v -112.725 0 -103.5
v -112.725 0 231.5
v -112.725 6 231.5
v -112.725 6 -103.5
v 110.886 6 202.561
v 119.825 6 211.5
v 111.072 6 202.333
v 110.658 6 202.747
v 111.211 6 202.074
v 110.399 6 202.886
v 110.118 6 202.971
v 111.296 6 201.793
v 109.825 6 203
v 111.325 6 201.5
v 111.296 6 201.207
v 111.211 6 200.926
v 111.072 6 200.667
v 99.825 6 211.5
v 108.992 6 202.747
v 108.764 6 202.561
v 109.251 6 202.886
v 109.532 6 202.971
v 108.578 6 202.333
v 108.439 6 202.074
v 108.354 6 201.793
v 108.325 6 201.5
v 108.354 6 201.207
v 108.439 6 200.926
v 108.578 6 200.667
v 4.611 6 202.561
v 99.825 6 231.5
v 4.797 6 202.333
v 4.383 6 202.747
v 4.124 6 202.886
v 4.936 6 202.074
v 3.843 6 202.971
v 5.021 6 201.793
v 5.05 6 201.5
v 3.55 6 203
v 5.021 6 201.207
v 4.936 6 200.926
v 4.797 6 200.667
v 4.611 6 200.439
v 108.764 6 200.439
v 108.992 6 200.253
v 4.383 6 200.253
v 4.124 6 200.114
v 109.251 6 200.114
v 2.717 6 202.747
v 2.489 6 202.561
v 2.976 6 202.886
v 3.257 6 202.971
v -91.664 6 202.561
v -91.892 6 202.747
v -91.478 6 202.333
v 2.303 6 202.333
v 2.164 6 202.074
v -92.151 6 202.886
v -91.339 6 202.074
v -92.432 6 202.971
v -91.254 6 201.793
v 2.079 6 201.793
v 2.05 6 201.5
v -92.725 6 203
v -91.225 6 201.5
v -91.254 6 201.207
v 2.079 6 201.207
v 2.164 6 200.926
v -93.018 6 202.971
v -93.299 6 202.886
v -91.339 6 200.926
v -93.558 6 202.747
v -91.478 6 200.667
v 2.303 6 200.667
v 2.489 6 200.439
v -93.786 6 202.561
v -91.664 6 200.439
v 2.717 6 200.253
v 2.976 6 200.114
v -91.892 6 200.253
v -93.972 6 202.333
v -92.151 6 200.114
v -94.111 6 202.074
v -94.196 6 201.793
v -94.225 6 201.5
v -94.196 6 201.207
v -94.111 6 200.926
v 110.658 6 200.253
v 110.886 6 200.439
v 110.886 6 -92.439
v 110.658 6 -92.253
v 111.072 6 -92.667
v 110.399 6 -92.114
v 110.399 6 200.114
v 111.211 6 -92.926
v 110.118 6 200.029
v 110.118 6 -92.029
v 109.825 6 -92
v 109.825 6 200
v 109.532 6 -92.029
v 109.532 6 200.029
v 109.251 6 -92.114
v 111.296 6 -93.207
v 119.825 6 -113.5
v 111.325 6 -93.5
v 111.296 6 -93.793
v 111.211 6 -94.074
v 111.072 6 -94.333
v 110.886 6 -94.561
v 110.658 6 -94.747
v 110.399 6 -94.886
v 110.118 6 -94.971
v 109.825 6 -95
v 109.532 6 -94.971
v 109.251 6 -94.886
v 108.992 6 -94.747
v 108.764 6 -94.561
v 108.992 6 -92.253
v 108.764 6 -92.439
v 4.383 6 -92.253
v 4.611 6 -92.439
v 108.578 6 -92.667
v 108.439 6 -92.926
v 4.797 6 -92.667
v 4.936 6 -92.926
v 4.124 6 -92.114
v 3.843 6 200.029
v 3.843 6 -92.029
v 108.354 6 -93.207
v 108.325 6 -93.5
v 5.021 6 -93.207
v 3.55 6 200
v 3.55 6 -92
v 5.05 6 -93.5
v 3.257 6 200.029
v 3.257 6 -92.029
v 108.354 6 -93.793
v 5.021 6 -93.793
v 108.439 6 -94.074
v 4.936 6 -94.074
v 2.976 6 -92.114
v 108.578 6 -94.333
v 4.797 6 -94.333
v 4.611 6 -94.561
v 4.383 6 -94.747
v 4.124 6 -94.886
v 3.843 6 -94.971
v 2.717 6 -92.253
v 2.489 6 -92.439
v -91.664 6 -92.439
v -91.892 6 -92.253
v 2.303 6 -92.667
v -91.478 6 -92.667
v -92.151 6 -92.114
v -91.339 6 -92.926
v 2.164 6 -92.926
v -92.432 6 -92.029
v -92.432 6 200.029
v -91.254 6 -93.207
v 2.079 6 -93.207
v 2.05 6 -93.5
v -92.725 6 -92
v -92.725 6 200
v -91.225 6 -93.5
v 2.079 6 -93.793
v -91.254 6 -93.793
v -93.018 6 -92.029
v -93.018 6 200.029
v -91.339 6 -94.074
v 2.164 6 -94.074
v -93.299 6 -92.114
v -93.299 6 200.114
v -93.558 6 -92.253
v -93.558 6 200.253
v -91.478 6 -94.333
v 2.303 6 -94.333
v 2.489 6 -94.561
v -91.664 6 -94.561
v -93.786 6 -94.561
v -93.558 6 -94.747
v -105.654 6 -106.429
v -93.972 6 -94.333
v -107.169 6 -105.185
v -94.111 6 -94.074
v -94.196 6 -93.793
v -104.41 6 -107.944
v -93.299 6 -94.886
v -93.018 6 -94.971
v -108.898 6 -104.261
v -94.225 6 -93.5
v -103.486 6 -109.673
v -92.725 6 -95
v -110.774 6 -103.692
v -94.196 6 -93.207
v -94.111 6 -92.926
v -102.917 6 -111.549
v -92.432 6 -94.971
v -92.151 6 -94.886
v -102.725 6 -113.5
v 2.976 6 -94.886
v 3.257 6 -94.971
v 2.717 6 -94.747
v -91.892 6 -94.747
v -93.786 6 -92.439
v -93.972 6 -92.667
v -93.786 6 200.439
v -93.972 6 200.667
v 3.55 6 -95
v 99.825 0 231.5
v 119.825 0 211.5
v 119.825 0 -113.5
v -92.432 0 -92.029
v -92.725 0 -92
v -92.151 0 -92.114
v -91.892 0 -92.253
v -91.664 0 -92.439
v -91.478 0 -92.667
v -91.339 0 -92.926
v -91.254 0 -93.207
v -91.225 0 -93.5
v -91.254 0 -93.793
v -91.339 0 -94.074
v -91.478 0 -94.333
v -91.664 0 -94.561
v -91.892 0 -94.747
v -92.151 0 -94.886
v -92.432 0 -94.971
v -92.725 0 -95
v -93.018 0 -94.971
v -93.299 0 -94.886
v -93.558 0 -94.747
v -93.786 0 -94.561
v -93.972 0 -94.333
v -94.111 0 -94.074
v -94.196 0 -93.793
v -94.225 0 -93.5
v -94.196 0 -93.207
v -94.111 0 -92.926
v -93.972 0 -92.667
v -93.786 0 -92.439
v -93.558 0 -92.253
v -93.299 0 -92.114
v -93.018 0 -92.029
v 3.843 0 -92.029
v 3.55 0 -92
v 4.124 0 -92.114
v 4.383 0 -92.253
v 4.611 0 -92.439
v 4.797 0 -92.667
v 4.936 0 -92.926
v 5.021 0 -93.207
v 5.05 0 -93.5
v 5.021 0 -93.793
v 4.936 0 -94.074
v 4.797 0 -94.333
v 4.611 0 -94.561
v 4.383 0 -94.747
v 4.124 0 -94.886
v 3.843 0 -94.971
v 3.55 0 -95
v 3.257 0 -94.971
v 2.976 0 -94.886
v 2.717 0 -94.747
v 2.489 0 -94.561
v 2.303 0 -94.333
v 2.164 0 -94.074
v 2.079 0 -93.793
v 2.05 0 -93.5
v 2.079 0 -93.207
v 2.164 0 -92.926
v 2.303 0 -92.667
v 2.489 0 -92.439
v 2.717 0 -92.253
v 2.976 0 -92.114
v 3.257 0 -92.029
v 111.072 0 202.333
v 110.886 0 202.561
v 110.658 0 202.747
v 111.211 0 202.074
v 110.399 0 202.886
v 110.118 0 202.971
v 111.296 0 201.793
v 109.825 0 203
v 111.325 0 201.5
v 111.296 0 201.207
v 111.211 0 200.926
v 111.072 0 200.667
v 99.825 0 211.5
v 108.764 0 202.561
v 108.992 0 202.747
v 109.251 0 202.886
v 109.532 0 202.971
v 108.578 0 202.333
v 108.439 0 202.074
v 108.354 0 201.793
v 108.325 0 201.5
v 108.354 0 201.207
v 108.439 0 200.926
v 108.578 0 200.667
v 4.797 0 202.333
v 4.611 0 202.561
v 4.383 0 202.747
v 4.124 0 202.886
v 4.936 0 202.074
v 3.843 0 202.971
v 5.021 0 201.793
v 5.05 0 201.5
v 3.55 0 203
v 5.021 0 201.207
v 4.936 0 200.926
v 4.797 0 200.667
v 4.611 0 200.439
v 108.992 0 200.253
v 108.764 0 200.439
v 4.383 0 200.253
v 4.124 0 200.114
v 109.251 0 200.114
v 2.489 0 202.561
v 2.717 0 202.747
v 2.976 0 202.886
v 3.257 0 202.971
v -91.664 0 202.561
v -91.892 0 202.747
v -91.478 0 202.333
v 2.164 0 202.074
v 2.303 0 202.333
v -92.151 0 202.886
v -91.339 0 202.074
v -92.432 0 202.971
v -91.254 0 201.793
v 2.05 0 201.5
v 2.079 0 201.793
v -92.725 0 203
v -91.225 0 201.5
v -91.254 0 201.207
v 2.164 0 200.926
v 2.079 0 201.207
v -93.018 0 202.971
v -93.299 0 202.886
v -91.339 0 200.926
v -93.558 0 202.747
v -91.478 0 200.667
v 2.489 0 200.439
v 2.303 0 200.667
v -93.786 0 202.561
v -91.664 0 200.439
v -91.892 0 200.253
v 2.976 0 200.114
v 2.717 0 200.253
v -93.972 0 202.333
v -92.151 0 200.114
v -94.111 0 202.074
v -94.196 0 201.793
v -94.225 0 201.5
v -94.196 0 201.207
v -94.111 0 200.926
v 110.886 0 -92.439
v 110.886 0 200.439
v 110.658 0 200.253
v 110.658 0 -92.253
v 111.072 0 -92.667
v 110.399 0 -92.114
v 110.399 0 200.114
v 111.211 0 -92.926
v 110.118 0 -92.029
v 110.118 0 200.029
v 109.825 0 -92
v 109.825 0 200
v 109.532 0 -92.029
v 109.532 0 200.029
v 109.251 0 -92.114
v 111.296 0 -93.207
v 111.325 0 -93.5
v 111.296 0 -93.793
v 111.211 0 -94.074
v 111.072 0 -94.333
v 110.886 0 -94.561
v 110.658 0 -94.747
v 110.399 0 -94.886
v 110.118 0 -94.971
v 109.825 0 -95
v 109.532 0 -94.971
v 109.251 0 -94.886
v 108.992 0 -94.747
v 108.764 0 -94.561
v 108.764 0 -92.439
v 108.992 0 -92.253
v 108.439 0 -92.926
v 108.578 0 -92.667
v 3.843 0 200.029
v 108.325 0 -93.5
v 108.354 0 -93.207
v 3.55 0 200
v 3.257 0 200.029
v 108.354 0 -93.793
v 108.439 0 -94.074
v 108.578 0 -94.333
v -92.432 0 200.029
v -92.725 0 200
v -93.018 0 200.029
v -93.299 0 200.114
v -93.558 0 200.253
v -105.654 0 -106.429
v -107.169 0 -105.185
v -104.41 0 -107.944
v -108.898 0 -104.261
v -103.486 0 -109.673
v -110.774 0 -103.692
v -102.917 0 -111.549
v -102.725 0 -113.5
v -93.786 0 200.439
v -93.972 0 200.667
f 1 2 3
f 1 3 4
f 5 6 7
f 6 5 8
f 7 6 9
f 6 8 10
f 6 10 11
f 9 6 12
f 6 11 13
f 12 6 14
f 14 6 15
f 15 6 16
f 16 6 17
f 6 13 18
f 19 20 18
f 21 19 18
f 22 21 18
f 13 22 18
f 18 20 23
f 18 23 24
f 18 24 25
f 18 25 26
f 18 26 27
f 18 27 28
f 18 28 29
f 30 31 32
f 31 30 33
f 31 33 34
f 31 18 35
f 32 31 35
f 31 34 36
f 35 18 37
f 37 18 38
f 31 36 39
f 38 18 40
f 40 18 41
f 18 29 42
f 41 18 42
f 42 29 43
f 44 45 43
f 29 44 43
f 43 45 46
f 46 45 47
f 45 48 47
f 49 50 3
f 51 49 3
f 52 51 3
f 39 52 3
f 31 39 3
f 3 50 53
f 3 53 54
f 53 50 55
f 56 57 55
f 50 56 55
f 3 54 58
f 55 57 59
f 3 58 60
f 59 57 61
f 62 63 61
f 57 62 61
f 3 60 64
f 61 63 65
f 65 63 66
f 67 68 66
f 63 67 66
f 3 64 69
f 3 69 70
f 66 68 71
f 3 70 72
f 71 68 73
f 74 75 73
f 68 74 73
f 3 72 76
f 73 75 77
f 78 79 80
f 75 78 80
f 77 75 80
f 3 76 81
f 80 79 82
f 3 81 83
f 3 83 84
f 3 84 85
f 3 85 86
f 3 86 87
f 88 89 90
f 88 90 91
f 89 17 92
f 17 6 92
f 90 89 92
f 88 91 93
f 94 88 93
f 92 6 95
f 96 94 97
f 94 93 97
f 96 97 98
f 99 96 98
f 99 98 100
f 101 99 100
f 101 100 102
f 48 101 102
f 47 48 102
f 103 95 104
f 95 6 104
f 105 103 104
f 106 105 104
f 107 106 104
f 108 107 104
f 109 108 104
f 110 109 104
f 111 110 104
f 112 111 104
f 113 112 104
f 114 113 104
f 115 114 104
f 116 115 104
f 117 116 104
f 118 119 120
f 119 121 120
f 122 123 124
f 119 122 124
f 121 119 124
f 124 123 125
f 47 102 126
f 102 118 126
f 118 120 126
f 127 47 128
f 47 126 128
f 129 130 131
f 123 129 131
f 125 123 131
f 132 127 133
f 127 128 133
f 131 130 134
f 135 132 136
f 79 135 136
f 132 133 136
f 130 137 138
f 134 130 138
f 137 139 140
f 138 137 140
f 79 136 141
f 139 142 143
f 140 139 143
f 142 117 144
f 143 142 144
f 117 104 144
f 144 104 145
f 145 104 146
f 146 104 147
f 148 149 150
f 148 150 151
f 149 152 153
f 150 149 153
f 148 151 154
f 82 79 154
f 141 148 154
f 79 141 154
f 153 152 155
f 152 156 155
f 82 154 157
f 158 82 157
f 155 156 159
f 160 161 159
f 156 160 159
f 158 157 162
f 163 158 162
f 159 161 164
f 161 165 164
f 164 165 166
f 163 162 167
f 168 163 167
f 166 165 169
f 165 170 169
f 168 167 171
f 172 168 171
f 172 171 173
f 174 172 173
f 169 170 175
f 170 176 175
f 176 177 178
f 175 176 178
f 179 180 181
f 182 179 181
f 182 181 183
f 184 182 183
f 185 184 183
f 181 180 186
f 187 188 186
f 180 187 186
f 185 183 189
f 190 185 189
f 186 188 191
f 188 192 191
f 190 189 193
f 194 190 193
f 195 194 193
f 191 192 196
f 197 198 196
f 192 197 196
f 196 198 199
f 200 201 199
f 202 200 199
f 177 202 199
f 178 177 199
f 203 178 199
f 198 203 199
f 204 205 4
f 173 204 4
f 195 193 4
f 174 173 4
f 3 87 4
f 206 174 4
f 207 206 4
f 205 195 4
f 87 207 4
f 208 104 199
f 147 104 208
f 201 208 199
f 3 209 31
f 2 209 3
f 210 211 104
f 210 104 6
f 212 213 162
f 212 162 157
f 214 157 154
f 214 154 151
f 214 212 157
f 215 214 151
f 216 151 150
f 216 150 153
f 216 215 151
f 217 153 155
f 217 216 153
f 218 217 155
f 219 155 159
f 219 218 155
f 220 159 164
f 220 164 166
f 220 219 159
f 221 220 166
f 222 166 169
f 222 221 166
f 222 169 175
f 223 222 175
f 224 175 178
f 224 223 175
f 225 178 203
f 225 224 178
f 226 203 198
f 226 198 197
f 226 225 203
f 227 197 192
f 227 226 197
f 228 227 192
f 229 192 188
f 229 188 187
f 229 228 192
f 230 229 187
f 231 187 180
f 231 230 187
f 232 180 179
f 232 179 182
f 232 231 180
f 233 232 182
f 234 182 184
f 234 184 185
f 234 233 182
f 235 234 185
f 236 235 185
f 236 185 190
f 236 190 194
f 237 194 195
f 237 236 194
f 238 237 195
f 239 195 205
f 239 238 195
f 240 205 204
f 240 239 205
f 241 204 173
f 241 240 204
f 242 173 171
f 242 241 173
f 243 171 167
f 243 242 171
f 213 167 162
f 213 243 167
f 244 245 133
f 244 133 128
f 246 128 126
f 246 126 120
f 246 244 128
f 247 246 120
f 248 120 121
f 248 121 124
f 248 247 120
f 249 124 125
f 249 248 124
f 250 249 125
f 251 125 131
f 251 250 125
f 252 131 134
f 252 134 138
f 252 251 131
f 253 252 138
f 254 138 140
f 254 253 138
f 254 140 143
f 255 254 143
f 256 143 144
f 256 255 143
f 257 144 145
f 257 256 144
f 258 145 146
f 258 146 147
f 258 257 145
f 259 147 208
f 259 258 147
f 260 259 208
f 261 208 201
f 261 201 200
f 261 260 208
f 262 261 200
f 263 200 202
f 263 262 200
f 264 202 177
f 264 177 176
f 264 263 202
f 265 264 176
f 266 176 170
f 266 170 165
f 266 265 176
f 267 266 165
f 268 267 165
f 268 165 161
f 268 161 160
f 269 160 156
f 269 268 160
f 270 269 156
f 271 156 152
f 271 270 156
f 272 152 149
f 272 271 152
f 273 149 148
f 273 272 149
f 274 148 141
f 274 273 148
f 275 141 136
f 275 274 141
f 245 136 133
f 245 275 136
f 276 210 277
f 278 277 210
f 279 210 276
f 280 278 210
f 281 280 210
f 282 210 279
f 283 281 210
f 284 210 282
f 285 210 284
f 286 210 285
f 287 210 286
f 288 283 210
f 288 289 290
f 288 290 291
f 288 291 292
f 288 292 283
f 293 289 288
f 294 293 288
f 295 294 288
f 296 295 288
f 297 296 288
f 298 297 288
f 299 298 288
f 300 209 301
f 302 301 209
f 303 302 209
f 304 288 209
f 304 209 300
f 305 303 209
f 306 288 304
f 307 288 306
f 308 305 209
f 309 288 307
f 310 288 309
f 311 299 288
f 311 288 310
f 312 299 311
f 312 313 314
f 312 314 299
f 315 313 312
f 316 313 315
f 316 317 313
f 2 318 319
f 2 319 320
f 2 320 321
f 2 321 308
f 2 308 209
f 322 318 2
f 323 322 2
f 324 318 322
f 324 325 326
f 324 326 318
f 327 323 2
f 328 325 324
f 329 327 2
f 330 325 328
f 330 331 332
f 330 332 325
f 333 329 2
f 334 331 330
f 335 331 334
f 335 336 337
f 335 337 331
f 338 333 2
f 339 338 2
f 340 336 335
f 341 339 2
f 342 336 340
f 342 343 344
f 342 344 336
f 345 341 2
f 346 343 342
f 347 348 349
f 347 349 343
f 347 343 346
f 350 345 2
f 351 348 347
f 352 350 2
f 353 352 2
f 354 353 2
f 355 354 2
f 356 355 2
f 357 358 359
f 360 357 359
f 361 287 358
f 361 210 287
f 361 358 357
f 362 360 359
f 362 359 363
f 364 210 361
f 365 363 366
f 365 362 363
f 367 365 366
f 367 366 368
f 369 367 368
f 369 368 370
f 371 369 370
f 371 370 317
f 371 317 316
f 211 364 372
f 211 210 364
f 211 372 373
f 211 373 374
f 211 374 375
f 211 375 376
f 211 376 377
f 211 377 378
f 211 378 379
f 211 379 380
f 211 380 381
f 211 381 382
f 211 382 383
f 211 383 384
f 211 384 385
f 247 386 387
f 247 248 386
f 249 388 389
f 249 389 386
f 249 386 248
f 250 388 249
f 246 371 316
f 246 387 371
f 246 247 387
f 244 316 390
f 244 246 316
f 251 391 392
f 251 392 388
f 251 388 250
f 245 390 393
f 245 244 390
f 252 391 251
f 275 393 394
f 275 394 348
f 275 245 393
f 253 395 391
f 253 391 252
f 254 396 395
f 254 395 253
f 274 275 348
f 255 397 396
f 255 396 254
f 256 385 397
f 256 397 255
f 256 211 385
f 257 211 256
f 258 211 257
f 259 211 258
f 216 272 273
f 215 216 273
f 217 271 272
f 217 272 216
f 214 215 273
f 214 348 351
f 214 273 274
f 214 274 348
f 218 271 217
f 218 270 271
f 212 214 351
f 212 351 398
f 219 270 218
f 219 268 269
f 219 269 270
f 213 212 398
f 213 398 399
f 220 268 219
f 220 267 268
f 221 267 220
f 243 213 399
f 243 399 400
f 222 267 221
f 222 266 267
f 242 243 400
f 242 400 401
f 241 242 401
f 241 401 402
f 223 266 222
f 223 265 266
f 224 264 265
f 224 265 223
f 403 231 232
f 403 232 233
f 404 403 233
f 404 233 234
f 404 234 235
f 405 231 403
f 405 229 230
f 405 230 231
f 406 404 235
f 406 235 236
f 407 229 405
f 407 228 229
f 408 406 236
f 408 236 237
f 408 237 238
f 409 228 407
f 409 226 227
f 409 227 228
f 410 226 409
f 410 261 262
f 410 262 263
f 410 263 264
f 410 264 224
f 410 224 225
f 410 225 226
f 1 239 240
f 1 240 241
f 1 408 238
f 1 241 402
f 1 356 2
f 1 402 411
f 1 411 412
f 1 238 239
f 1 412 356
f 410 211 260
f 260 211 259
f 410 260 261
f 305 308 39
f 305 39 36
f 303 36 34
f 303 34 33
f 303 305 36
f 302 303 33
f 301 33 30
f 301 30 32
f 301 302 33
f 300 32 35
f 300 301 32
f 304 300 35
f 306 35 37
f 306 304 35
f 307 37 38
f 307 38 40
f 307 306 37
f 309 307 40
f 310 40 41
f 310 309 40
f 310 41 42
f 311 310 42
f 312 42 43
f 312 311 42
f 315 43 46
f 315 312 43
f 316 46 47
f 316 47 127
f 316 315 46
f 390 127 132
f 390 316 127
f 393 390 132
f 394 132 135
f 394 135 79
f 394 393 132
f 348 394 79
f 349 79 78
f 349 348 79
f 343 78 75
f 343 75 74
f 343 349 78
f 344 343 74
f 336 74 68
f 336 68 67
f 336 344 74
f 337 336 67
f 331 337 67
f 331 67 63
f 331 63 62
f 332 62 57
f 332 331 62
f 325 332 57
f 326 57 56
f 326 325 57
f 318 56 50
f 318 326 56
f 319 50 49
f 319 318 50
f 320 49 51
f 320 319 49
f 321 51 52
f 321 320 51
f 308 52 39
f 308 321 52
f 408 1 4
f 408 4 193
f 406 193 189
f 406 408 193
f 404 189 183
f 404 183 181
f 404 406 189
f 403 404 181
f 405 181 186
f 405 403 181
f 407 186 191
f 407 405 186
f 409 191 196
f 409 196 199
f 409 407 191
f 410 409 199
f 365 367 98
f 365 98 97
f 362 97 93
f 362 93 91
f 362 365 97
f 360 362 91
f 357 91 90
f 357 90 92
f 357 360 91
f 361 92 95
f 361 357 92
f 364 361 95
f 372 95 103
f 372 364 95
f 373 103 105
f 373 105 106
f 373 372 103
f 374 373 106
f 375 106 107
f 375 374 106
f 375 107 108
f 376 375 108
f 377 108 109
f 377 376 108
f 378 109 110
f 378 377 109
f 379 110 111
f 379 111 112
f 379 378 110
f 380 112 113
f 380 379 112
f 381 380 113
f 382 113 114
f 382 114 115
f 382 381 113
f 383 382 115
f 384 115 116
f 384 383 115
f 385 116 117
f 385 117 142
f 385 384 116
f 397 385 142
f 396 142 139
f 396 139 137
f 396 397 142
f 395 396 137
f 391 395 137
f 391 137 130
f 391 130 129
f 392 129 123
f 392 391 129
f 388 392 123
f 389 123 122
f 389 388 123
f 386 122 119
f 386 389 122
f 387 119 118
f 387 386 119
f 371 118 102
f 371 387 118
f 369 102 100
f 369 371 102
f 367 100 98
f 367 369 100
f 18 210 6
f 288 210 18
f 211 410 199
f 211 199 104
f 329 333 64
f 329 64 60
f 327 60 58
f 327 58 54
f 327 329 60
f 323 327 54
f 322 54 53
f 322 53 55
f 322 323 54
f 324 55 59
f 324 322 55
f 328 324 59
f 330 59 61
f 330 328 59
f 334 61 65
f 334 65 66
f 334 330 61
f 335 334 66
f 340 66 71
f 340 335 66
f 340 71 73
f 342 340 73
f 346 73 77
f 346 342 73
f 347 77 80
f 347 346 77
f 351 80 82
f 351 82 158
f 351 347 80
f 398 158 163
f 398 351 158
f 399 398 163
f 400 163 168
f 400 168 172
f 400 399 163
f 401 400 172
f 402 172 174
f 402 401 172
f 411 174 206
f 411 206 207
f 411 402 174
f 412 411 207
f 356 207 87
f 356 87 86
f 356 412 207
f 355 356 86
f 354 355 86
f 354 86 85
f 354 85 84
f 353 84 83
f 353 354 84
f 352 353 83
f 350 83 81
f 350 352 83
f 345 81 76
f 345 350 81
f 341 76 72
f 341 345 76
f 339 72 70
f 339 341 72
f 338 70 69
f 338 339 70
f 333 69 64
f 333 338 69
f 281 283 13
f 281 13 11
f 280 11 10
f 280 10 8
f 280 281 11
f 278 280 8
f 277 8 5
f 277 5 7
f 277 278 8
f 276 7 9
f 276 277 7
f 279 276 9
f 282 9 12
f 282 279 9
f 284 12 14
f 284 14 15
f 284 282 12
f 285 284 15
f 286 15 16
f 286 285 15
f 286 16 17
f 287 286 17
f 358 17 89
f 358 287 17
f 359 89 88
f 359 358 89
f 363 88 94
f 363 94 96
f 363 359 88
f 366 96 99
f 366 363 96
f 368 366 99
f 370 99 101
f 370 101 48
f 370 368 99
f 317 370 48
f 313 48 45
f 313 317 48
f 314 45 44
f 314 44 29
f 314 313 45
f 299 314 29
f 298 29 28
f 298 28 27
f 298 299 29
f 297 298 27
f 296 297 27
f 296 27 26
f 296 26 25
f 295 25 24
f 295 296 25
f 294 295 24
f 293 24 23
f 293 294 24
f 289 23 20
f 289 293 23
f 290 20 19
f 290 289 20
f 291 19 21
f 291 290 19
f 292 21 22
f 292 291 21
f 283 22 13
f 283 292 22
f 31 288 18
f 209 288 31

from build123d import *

# Parameters (mm, degrees)
SKETCH_1_R      = 1.5
EXTRUDE_1_DEPTH = 6


with BuildPart() as part:
    # 草图1 → 凸台-拉伸1 (new body)
    with BuildSketch(Plane(origin=(0, 0, 0), x_dir=(1, 0, 0), z_dir=(0, 1, 0))):
        with BuildLine():
            Line((-102.725, 113.5), (119.825, 113.5))
            Line((119.825, 113.5), (119.825, -211.5))
            Line((119.825, -211.5), (99.825, -211.5))
            Line((99.825, -211.5), (99.825, -231.5))
            Line((99.825, -231.5), (-112.725, -231.5))
            Line((-112.725, -231.5), (-112.725, 103.5))
            ThreePointArc((-112.725, 103.5), (-105.653932188, 106.428932188), (-102.725, 113.5))
        make_face()
        with Locations(Location((-92.725, 93.5, 0), (0, 0, 270))):
            Circle(SKETCH_1_R, mode=Mode.SUBTRACT)
        with Locations(Location((109.825, 93.5, 0), (0, 0, 270))):
            Circle(SKETCH_1_R, mode=Mode.SUBTRACT)
        with Locations(Location((3.55, 93.5, 0), (0, 0, 270))):
            Circle(SKETCH_1_R, mode=Mode.SUBTRACT)
        with Locations(Location((-92.725, -201.5, 0), (0, 0, 270))):
            Circle(SKETCH_1_R, mode=Mode.SUBTRACT)
        with Locations(Location((3.55, -201.5, 0), (0, 0, 270))):
            Circle(SKETCH_1_R, mode=Mode.SUBTRACT)
        with Locations(Location((109.825, -201.5, 0), (0, 0, 270))):
            Circle(SKETCH_1_R, mode=Mode.SUBTRACT)
    extrude(amount=EXTRUDE_1_DEPTH)


solid = part.part
